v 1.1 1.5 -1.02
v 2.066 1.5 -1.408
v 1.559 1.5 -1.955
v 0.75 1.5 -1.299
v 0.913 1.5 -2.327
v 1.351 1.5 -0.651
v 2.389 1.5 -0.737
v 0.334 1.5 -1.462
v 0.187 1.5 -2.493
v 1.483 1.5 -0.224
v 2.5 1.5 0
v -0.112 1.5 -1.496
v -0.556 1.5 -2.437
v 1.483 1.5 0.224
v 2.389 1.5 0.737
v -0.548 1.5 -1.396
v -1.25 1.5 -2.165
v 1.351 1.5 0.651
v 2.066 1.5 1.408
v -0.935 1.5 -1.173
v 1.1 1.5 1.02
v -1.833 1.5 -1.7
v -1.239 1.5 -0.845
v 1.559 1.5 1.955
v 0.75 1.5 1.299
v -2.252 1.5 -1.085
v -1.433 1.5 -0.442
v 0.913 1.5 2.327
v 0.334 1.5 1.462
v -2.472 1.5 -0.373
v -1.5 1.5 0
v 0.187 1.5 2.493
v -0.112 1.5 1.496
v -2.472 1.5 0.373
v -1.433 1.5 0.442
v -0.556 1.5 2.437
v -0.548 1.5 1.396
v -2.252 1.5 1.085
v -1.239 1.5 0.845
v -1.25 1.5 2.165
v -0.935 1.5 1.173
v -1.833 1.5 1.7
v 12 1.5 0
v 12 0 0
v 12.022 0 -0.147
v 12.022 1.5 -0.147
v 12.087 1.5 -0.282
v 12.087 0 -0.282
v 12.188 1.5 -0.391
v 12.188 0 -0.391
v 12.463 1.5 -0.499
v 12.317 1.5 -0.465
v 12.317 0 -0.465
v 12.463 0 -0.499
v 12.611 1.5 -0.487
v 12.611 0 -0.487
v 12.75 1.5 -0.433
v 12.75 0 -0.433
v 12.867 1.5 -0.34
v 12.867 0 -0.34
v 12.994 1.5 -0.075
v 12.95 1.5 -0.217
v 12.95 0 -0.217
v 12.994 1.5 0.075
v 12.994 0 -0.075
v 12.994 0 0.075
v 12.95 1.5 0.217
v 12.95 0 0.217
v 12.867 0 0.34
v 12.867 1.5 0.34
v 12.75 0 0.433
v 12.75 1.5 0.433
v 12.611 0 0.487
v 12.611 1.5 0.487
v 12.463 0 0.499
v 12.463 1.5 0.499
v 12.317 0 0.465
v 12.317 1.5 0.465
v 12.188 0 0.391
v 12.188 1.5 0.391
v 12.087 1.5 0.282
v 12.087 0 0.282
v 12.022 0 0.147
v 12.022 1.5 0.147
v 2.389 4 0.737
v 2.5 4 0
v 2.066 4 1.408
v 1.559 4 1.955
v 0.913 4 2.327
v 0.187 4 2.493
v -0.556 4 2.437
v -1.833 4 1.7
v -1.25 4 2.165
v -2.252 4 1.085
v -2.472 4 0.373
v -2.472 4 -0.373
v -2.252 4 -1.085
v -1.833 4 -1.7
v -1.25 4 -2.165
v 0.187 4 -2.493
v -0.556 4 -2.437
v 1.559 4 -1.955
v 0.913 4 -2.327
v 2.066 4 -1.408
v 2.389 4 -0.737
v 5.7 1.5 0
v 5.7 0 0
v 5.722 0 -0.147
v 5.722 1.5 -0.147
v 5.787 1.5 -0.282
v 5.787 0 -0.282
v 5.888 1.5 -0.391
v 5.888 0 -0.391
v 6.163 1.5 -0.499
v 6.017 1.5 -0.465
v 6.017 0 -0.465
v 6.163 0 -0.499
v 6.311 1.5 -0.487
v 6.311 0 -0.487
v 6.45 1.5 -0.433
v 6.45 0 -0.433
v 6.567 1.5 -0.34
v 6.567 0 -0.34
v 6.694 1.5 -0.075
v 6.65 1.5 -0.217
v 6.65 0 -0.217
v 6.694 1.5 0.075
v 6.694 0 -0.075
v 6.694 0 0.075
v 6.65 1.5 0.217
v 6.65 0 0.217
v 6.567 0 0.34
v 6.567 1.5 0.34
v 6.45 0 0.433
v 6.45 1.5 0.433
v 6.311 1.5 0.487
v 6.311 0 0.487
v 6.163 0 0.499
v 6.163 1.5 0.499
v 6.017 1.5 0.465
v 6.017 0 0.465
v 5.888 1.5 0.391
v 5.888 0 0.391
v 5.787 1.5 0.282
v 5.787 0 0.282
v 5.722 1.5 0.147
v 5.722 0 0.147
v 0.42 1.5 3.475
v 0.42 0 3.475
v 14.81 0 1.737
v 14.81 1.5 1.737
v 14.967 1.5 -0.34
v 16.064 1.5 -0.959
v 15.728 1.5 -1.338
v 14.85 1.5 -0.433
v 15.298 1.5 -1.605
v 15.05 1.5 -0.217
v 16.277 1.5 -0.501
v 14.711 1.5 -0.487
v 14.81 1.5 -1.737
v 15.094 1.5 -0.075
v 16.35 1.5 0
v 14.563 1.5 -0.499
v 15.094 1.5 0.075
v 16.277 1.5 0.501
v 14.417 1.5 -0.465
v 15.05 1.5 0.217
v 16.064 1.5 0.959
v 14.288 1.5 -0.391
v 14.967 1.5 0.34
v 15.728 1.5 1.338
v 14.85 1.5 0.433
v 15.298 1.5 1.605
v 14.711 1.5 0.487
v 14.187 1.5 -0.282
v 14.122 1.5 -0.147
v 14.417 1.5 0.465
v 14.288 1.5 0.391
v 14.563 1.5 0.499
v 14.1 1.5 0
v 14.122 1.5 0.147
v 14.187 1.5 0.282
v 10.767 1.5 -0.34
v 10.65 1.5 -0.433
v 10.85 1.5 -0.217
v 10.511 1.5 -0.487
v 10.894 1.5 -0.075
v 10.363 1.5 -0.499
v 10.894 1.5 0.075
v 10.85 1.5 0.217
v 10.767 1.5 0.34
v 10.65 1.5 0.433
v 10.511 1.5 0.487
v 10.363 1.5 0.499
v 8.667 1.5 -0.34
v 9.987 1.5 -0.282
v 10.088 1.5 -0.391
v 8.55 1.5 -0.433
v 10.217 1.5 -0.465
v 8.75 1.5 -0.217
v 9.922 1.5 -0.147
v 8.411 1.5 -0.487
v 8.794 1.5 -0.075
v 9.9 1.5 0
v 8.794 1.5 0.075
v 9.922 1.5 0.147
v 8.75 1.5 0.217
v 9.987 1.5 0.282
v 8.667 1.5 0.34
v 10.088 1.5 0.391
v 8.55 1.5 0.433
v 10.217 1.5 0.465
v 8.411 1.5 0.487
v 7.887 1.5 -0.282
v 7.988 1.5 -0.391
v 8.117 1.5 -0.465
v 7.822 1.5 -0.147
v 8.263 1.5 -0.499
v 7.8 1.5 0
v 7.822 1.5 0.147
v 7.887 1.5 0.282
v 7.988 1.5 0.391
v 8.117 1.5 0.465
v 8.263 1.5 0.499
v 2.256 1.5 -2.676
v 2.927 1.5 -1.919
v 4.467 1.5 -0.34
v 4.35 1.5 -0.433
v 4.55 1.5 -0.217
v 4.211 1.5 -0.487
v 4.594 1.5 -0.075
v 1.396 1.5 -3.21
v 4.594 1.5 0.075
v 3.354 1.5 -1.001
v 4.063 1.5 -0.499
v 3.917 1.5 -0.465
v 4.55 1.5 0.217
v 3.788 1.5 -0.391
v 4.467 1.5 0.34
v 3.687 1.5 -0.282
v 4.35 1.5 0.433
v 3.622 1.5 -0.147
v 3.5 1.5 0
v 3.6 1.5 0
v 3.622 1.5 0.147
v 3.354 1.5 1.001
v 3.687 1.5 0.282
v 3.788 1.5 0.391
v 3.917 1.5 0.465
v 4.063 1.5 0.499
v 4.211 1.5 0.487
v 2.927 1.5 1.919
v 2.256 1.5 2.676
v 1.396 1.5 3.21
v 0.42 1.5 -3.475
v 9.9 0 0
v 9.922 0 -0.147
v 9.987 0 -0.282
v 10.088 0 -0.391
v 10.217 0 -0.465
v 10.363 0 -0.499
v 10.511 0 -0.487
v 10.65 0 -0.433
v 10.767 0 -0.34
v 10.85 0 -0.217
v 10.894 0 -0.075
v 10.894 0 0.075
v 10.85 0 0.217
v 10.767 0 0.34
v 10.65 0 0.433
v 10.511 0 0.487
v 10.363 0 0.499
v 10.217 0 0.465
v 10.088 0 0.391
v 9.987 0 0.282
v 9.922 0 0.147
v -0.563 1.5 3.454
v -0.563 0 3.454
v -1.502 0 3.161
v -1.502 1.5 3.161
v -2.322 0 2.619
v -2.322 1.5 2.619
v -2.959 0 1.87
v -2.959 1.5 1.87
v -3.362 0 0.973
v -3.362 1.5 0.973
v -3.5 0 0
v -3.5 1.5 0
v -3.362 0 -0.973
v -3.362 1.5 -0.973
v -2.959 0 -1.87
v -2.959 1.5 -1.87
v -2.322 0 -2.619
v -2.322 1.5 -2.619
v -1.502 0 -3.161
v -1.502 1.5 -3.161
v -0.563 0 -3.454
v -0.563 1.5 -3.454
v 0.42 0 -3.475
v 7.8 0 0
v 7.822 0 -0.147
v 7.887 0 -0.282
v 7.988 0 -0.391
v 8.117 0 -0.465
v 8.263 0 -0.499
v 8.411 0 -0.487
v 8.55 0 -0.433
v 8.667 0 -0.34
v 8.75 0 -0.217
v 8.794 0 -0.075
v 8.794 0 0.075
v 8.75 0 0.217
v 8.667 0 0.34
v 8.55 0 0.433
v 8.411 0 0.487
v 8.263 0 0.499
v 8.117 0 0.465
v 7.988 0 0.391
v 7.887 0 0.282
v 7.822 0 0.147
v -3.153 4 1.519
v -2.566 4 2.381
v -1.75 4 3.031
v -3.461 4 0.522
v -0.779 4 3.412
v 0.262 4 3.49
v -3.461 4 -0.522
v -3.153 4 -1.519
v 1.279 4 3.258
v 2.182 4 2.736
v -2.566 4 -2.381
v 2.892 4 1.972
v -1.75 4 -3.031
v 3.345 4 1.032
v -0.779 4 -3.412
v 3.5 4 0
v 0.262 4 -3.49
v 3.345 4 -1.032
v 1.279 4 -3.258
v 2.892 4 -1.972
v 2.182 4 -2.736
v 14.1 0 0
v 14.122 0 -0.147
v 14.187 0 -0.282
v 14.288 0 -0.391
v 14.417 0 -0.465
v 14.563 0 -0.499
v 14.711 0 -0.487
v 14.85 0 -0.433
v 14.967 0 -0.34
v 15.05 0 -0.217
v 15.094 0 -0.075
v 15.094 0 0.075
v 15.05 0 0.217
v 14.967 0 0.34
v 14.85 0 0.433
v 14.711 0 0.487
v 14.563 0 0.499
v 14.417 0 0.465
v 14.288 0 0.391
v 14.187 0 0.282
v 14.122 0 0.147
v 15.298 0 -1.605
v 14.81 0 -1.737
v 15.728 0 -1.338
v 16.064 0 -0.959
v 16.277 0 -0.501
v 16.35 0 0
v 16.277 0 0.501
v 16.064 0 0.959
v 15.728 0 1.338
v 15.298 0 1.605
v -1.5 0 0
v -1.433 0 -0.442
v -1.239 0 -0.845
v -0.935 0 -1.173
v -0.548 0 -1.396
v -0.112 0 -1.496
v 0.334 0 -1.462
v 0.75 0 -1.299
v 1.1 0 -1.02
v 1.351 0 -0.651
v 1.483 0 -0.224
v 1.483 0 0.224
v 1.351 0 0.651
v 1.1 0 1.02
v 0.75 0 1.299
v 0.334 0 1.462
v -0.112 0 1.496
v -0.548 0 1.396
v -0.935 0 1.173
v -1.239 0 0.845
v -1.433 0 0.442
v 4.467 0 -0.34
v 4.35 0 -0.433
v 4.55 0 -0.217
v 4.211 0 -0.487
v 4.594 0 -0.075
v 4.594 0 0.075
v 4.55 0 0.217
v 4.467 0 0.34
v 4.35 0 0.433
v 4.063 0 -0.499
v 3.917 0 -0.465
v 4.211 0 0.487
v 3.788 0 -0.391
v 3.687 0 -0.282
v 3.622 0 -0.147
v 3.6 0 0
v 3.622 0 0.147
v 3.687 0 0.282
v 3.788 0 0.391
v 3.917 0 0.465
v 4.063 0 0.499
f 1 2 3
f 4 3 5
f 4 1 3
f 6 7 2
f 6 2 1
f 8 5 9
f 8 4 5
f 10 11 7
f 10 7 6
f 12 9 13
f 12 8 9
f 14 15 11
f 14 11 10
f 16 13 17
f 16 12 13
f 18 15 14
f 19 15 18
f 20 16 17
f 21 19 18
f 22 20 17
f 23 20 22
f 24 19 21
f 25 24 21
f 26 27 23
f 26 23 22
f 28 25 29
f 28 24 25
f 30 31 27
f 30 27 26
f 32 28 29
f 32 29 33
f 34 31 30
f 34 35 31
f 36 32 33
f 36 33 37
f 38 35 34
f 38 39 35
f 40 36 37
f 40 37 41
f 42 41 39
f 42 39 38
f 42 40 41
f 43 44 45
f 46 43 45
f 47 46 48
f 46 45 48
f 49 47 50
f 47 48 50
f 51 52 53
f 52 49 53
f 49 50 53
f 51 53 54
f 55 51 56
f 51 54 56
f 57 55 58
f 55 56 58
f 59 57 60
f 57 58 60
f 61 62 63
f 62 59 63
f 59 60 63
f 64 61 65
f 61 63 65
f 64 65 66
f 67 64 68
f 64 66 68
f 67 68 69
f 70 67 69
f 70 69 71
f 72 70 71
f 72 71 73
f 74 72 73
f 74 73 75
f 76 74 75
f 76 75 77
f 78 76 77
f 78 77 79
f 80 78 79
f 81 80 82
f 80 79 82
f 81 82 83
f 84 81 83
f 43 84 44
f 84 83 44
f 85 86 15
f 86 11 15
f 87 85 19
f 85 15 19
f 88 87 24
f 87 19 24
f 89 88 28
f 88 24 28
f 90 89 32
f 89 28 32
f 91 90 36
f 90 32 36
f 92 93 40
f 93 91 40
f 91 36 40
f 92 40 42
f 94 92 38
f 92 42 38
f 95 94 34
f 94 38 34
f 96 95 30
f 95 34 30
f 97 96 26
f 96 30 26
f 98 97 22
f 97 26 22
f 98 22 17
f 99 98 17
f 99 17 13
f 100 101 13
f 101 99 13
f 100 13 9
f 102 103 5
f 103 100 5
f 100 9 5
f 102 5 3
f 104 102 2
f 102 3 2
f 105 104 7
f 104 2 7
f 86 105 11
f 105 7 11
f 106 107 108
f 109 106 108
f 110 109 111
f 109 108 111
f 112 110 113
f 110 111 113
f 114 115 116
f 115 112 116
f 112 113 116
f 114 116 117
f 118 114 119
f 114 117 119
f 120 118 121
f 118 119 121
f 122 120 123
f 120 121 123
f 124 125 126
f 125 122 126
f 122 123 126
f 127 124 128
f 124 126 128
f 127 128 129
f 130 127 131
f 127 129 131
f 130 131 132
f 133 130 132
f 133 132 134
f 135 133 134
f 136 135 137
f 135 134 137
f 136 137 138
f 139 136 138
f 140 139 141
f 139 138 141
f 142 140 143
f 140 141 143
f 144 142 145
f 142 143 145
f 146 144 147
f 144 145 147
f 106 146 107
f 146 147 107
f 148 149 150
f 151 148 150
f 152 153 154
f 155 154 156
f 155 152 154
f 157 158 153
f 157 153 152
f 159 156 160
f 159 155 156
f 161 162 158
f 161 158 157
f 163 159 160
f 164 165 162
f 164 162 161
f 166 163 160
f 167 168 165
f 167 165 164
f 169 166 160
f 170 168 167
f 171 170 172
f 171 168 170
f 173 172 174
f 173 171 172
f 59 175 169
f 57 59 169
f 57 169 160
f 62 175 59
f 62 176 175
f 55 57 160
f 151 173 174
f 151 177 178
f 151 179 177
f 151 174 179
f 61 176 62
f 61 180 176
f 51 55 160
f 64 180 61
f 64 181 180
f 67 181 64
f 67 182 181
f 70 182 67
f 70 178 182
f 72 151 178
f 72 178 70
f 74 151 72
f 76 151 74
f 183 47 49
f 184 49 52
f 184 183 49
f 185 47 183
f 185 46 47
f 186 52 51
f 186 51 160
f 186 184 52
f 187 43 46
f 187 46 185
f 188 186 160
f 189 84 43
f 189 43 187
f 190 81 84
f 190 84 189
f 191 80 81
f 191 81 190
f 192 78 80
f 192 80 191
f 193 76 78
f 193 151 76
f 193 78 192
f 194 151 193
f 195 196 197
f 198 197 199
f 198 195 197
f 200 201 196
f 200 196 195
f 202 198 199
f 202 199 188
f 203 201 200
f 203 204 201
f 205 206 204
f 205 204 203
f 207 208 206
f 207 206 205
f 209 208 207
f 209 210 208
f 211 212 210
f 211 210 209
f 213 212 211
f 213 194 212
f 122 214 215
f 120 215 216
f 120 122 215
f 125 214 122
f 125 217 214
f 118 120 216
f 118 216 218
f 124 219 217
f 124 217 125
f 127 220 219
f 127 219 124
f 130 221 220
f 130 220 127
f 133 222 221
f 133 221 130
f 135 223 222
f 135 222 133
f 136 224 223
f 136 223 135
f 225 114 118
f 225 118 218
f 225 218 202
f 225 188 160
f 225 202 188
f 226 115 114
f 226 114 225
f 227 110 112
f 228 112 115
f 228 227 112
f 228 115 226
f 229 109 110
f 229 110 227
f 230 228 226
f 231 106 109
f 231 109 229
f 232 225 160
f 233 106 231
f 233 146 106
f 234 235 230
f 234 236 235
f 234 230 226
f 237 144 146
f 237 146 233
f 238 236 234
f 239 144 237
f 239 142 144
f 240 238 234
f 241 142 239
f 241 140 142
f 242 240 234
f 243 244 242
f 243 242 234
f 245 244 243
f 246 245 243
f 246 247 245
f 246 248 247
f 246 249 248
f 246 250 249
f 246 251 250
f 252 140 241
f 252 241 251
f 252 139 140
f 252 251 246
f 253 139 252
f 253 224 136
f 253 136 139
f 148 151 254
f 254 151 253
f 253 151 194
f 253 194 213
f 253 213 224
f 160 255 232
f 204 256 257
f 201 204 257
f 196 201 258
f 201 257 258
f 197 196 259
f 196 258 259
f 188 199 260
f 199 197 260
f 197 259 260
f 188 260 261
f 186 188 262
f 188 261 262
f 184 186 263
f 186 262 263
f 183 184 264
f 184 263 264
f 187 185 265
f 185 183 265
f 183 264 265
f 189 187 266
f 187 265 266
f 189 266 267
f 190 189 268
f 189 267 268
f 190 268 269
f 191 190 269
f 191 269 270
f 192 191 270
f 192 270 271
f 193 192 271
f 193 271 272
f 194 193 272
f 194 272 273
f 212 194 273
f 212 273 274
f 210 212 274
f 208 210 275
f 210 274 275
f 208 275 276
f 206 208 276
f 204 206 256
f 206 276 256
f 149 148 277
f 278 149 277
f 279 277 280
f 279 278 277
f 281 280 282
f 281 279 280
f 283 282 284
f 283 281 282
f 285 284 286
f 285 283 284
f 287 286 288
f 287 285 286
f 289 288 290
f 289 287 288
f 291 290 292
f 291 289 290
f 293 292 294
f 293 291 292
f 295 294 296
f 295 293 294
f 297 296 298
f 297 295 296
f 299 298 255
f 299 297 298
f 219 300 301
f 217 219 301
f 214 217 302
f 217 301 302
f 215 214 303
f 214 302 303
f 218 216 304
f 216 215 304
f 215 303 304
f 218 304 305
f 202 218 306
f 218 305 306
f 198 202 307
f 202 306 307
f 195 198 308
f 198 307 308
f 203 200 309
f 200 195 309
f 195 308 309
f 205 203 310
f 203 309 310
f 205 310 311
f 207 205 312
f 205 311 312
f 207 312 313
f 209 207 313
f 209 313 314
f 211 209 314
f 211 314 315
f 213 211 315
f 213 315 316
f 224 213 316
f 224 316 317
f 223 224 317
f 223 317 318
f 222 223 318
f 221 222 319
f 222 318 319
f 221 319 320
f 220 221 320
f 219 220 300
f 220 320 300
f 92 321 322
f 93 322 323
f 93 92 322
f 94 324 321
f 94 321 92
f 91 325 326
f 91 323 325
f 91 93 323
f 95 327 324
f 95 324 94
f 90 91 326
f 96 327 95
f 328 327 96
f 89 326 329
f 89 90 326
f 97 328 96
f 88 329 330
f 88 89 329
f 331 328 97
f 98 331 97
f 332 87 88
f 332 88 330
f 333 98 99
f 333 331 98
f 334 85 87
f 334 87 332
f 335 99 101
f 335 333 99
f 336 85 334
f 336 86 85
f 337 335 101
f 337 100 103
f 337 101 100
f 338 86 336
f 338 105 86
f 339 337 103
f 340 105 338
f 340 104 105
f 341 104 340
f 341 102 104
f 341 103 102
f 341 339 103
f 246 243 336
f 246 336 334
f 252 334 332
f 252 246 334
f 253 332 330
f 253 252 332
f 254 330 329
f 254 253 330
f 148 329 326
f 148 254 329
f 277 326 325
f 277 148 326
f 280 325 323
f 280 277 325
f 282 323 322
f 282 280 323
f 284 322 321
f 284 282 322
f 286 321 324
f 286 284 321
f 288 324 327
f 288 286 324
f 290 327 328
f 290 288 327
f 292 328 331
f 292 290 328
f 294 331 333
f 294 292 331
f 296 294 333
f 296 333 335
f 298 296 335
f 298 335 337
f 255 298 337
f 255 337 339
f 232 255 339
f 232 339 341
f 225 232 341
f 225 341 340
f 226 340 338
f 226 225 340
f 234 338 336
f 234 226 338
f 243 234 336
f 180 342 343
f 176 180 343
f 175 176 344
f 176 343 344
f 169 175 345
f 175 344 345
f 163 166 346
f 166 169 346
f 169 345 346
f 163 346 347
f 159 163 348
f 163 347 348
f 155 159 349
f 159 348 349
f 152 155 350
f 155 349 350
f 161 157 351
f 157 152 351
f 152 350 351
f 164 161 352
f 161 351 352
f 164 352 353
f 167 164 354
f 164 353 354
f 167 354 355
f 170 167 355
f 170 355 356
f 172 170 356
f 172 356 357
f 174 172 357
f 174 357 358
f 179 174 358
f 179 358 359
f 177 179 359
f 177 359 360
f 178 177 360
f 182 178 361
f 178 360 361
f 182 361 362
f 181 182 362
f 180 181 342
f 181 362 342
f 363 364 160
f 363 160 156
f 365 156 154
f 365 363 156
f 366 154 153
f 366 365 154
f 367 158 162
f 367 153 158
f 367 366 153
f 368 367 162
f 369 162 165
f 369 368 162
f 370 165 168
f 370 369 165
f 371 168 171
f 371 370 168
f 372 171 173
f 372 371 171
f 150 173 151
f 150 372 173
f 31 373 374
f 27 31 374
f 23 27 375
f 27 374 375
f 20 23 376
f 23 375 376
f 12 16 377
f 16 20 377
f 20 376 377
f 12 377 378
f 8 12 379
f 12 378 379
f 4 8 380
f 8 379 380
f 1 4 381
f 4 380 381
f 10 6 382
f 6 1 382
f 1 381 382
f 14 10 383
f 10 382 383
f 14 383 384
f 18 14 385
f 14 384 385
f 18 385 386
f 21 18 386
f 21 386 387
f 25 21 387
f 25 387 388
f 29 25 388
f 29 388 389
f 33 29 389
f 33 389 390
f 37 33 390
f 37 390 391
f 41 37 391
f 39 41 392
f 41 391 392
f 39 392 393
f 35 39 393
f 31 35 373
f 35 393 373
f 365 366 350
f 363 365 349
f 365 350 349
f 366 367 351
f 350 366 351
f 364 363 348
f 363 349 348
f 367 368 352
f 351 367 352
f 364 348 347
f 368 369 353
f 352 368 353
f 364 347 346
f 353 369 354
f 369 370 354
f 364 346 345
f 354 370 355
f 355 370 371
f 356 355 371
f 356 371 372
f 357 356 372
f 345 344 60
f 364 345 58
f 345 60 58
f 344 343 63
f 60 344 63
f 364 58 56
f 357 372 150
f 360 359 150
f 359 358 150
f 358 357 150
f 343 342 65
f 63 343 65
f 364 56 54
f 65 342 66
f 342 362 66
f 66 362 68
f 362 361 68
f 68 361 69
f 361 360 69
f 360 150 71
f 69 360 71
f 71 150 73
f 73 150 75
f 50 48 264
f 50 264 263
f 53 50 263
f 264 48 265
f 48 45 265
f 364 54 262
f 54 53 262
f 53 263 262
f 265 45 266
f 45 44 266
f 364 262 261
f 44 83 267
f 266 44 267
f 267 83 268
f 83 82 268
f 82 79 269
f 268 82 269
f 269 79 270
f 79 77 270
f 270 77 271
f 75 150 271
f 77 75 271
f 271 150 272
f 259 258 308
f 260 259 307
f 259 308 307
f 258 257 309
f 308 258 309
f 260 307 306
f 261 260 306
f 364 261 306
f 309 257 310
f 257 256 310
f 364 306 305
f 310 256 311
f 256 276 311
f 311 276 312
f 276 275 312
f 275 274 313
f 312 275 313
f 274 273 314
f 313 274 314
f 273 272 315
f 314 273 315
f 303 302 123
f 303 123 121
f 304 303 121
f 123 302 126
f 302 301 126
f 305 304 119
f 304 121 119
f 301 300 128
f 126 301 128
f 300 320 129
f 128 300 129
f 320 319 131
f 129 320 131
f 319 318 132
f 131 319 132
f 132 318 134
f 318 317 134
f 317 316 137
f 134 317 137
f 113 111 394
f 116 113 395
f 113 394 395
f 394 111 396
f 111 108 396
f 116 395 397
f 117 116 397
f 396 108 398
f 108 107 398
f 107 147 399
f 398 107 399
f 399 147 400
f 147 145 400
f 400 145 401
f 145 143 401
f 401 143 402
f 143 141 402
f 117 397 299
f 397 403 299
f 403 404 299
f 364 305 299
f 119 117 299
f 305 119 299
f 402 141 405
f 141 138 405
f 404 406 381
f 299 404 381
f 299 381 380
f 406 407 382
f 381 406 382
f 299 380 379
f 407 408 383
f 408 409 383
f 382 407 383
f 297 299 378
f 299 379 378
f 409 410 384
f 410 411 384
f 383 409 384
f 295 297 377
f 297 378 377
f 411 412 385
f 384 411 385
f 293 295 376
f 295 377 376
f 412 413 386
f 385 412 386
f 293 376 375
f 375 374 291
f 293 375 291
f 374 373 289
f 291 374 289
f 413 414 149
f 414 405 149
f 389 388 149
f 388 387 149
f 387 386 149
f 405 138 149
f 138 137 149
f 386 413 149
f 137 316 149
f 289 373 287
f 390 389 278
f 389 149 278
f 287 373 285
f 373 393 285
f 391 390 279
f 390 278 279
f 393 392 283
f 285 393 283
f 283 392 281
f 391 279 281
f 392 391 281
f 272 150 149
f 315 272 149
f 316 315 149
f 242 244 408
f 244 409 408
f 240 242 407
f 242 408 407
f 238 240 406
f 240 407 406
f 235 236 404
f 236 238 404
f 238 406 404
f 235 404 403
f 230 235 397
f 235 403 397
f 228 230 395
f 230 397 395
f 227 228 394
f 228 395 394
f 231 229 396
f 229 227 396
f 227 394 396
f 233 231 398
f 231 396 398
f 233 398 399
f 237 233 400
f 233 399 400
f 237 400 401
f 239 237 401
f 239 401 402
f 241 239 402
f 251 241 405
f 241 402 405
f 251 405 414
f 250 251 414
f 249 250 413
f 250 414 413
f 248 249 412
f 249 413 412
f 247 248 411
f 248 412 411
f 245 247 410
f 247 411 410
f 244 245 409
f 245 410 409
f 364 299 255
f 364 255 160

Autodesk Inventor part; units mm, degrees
ref_plane "YZ Plane" through (0, 0, 0) normal (1, 0, 0) x (0, 1, 0)
ref_plane "XZ Plane" through (0, 0, 0) normal (0, 1, 0) x (-1, 0, 0)
ref_plane "XY Plane" through (0, 0, 0) normal (0, 0, 1) x (1, 0, 0)
sketch "草图1" plane through (0, 0, 0) normal (0, 1, 0) x (-1, 0, 0)
  circle A0 centre (0, 0) radius 1.5
  line L0 (0, 0) -> (-13.1253, 0) construction
  circle A1 centre (-4.1, 0) radius 0.5
  circle A2 centre (-6.2, 0) radius 0.5
  circle A3 centre (-8.3, 0) radius 0.5
  circle A4 centre (-10.4, 0) radius 0.5
  circle A5 centre (-12.5, 0) radius 0.5
  circle A6 centre (-14.6, 0) radius 0.5
  arc A7 (-0.4195, -3.4748) -> (-0.4195, 3.4748) centre (0, 0) ccw
  arc A8 (-14.8098, 1.7374) -> (-14.8098, -1.7374) centre (-14.6, 0) ccw
  line L1 (-0.4195, -3.4748) -> (-14.8098, -1.7374)
  line L2 (-0.4195, 3.4748) -> (-14.8098, 1.7374)
  dimension "d0" = 3
  dimension "d1" = 1
  dimension "d2" = 4.1
  dimension "d5" = 2.1
  dimension "d10" = 7
  dimension "d11" = 3.5
extrude "拉伸1" add sketch "草图1" along normal blind 1.5
sketch "草图2" plane through (0, 1.5, 0) normal (0, 1, 0) x (1, 0, 0)
  circle A0 centre (0, 0) radius 3.5
  line L0 (0.4195, -3.4748) -> (14.8098, -1.7374) projected
  arc A1 (14.8098, -1.7374) -> (14.8098, 1.7374) centre (14.6, 0) ccw projected
  line L1 (14.8098, 1.7374) -> (0.4195, 3.4748) projected
  arc A2 (0.4195, 3.4748) -> (0.4195, -3.4748) centre (0, 0) ccw projected
  circle A3 centre (4.1, 0) radius 0.5 projected
  circle A4 centre (6.2, 0) radius 0.5 projected
  circle A5 centre (8.3, 0) radius 0.5 projected
  circle A6 centre (10.4, 0) radius 0.5 projected
  circle A7 centre (12.5, 0) radius 0.5 projected
  circle A8 centre (14.6, 0) radius 0.5 projected
  circle A9 centre (0, 0) radius 1.5 projected
  circle A10 centre (0, 0) radius 2.5
  dimension "d16" = 5
extrude "拉伸2" add sketch "草图2" along normal blind 2.5 contours A0
properties part number "sg90舵盘01"
